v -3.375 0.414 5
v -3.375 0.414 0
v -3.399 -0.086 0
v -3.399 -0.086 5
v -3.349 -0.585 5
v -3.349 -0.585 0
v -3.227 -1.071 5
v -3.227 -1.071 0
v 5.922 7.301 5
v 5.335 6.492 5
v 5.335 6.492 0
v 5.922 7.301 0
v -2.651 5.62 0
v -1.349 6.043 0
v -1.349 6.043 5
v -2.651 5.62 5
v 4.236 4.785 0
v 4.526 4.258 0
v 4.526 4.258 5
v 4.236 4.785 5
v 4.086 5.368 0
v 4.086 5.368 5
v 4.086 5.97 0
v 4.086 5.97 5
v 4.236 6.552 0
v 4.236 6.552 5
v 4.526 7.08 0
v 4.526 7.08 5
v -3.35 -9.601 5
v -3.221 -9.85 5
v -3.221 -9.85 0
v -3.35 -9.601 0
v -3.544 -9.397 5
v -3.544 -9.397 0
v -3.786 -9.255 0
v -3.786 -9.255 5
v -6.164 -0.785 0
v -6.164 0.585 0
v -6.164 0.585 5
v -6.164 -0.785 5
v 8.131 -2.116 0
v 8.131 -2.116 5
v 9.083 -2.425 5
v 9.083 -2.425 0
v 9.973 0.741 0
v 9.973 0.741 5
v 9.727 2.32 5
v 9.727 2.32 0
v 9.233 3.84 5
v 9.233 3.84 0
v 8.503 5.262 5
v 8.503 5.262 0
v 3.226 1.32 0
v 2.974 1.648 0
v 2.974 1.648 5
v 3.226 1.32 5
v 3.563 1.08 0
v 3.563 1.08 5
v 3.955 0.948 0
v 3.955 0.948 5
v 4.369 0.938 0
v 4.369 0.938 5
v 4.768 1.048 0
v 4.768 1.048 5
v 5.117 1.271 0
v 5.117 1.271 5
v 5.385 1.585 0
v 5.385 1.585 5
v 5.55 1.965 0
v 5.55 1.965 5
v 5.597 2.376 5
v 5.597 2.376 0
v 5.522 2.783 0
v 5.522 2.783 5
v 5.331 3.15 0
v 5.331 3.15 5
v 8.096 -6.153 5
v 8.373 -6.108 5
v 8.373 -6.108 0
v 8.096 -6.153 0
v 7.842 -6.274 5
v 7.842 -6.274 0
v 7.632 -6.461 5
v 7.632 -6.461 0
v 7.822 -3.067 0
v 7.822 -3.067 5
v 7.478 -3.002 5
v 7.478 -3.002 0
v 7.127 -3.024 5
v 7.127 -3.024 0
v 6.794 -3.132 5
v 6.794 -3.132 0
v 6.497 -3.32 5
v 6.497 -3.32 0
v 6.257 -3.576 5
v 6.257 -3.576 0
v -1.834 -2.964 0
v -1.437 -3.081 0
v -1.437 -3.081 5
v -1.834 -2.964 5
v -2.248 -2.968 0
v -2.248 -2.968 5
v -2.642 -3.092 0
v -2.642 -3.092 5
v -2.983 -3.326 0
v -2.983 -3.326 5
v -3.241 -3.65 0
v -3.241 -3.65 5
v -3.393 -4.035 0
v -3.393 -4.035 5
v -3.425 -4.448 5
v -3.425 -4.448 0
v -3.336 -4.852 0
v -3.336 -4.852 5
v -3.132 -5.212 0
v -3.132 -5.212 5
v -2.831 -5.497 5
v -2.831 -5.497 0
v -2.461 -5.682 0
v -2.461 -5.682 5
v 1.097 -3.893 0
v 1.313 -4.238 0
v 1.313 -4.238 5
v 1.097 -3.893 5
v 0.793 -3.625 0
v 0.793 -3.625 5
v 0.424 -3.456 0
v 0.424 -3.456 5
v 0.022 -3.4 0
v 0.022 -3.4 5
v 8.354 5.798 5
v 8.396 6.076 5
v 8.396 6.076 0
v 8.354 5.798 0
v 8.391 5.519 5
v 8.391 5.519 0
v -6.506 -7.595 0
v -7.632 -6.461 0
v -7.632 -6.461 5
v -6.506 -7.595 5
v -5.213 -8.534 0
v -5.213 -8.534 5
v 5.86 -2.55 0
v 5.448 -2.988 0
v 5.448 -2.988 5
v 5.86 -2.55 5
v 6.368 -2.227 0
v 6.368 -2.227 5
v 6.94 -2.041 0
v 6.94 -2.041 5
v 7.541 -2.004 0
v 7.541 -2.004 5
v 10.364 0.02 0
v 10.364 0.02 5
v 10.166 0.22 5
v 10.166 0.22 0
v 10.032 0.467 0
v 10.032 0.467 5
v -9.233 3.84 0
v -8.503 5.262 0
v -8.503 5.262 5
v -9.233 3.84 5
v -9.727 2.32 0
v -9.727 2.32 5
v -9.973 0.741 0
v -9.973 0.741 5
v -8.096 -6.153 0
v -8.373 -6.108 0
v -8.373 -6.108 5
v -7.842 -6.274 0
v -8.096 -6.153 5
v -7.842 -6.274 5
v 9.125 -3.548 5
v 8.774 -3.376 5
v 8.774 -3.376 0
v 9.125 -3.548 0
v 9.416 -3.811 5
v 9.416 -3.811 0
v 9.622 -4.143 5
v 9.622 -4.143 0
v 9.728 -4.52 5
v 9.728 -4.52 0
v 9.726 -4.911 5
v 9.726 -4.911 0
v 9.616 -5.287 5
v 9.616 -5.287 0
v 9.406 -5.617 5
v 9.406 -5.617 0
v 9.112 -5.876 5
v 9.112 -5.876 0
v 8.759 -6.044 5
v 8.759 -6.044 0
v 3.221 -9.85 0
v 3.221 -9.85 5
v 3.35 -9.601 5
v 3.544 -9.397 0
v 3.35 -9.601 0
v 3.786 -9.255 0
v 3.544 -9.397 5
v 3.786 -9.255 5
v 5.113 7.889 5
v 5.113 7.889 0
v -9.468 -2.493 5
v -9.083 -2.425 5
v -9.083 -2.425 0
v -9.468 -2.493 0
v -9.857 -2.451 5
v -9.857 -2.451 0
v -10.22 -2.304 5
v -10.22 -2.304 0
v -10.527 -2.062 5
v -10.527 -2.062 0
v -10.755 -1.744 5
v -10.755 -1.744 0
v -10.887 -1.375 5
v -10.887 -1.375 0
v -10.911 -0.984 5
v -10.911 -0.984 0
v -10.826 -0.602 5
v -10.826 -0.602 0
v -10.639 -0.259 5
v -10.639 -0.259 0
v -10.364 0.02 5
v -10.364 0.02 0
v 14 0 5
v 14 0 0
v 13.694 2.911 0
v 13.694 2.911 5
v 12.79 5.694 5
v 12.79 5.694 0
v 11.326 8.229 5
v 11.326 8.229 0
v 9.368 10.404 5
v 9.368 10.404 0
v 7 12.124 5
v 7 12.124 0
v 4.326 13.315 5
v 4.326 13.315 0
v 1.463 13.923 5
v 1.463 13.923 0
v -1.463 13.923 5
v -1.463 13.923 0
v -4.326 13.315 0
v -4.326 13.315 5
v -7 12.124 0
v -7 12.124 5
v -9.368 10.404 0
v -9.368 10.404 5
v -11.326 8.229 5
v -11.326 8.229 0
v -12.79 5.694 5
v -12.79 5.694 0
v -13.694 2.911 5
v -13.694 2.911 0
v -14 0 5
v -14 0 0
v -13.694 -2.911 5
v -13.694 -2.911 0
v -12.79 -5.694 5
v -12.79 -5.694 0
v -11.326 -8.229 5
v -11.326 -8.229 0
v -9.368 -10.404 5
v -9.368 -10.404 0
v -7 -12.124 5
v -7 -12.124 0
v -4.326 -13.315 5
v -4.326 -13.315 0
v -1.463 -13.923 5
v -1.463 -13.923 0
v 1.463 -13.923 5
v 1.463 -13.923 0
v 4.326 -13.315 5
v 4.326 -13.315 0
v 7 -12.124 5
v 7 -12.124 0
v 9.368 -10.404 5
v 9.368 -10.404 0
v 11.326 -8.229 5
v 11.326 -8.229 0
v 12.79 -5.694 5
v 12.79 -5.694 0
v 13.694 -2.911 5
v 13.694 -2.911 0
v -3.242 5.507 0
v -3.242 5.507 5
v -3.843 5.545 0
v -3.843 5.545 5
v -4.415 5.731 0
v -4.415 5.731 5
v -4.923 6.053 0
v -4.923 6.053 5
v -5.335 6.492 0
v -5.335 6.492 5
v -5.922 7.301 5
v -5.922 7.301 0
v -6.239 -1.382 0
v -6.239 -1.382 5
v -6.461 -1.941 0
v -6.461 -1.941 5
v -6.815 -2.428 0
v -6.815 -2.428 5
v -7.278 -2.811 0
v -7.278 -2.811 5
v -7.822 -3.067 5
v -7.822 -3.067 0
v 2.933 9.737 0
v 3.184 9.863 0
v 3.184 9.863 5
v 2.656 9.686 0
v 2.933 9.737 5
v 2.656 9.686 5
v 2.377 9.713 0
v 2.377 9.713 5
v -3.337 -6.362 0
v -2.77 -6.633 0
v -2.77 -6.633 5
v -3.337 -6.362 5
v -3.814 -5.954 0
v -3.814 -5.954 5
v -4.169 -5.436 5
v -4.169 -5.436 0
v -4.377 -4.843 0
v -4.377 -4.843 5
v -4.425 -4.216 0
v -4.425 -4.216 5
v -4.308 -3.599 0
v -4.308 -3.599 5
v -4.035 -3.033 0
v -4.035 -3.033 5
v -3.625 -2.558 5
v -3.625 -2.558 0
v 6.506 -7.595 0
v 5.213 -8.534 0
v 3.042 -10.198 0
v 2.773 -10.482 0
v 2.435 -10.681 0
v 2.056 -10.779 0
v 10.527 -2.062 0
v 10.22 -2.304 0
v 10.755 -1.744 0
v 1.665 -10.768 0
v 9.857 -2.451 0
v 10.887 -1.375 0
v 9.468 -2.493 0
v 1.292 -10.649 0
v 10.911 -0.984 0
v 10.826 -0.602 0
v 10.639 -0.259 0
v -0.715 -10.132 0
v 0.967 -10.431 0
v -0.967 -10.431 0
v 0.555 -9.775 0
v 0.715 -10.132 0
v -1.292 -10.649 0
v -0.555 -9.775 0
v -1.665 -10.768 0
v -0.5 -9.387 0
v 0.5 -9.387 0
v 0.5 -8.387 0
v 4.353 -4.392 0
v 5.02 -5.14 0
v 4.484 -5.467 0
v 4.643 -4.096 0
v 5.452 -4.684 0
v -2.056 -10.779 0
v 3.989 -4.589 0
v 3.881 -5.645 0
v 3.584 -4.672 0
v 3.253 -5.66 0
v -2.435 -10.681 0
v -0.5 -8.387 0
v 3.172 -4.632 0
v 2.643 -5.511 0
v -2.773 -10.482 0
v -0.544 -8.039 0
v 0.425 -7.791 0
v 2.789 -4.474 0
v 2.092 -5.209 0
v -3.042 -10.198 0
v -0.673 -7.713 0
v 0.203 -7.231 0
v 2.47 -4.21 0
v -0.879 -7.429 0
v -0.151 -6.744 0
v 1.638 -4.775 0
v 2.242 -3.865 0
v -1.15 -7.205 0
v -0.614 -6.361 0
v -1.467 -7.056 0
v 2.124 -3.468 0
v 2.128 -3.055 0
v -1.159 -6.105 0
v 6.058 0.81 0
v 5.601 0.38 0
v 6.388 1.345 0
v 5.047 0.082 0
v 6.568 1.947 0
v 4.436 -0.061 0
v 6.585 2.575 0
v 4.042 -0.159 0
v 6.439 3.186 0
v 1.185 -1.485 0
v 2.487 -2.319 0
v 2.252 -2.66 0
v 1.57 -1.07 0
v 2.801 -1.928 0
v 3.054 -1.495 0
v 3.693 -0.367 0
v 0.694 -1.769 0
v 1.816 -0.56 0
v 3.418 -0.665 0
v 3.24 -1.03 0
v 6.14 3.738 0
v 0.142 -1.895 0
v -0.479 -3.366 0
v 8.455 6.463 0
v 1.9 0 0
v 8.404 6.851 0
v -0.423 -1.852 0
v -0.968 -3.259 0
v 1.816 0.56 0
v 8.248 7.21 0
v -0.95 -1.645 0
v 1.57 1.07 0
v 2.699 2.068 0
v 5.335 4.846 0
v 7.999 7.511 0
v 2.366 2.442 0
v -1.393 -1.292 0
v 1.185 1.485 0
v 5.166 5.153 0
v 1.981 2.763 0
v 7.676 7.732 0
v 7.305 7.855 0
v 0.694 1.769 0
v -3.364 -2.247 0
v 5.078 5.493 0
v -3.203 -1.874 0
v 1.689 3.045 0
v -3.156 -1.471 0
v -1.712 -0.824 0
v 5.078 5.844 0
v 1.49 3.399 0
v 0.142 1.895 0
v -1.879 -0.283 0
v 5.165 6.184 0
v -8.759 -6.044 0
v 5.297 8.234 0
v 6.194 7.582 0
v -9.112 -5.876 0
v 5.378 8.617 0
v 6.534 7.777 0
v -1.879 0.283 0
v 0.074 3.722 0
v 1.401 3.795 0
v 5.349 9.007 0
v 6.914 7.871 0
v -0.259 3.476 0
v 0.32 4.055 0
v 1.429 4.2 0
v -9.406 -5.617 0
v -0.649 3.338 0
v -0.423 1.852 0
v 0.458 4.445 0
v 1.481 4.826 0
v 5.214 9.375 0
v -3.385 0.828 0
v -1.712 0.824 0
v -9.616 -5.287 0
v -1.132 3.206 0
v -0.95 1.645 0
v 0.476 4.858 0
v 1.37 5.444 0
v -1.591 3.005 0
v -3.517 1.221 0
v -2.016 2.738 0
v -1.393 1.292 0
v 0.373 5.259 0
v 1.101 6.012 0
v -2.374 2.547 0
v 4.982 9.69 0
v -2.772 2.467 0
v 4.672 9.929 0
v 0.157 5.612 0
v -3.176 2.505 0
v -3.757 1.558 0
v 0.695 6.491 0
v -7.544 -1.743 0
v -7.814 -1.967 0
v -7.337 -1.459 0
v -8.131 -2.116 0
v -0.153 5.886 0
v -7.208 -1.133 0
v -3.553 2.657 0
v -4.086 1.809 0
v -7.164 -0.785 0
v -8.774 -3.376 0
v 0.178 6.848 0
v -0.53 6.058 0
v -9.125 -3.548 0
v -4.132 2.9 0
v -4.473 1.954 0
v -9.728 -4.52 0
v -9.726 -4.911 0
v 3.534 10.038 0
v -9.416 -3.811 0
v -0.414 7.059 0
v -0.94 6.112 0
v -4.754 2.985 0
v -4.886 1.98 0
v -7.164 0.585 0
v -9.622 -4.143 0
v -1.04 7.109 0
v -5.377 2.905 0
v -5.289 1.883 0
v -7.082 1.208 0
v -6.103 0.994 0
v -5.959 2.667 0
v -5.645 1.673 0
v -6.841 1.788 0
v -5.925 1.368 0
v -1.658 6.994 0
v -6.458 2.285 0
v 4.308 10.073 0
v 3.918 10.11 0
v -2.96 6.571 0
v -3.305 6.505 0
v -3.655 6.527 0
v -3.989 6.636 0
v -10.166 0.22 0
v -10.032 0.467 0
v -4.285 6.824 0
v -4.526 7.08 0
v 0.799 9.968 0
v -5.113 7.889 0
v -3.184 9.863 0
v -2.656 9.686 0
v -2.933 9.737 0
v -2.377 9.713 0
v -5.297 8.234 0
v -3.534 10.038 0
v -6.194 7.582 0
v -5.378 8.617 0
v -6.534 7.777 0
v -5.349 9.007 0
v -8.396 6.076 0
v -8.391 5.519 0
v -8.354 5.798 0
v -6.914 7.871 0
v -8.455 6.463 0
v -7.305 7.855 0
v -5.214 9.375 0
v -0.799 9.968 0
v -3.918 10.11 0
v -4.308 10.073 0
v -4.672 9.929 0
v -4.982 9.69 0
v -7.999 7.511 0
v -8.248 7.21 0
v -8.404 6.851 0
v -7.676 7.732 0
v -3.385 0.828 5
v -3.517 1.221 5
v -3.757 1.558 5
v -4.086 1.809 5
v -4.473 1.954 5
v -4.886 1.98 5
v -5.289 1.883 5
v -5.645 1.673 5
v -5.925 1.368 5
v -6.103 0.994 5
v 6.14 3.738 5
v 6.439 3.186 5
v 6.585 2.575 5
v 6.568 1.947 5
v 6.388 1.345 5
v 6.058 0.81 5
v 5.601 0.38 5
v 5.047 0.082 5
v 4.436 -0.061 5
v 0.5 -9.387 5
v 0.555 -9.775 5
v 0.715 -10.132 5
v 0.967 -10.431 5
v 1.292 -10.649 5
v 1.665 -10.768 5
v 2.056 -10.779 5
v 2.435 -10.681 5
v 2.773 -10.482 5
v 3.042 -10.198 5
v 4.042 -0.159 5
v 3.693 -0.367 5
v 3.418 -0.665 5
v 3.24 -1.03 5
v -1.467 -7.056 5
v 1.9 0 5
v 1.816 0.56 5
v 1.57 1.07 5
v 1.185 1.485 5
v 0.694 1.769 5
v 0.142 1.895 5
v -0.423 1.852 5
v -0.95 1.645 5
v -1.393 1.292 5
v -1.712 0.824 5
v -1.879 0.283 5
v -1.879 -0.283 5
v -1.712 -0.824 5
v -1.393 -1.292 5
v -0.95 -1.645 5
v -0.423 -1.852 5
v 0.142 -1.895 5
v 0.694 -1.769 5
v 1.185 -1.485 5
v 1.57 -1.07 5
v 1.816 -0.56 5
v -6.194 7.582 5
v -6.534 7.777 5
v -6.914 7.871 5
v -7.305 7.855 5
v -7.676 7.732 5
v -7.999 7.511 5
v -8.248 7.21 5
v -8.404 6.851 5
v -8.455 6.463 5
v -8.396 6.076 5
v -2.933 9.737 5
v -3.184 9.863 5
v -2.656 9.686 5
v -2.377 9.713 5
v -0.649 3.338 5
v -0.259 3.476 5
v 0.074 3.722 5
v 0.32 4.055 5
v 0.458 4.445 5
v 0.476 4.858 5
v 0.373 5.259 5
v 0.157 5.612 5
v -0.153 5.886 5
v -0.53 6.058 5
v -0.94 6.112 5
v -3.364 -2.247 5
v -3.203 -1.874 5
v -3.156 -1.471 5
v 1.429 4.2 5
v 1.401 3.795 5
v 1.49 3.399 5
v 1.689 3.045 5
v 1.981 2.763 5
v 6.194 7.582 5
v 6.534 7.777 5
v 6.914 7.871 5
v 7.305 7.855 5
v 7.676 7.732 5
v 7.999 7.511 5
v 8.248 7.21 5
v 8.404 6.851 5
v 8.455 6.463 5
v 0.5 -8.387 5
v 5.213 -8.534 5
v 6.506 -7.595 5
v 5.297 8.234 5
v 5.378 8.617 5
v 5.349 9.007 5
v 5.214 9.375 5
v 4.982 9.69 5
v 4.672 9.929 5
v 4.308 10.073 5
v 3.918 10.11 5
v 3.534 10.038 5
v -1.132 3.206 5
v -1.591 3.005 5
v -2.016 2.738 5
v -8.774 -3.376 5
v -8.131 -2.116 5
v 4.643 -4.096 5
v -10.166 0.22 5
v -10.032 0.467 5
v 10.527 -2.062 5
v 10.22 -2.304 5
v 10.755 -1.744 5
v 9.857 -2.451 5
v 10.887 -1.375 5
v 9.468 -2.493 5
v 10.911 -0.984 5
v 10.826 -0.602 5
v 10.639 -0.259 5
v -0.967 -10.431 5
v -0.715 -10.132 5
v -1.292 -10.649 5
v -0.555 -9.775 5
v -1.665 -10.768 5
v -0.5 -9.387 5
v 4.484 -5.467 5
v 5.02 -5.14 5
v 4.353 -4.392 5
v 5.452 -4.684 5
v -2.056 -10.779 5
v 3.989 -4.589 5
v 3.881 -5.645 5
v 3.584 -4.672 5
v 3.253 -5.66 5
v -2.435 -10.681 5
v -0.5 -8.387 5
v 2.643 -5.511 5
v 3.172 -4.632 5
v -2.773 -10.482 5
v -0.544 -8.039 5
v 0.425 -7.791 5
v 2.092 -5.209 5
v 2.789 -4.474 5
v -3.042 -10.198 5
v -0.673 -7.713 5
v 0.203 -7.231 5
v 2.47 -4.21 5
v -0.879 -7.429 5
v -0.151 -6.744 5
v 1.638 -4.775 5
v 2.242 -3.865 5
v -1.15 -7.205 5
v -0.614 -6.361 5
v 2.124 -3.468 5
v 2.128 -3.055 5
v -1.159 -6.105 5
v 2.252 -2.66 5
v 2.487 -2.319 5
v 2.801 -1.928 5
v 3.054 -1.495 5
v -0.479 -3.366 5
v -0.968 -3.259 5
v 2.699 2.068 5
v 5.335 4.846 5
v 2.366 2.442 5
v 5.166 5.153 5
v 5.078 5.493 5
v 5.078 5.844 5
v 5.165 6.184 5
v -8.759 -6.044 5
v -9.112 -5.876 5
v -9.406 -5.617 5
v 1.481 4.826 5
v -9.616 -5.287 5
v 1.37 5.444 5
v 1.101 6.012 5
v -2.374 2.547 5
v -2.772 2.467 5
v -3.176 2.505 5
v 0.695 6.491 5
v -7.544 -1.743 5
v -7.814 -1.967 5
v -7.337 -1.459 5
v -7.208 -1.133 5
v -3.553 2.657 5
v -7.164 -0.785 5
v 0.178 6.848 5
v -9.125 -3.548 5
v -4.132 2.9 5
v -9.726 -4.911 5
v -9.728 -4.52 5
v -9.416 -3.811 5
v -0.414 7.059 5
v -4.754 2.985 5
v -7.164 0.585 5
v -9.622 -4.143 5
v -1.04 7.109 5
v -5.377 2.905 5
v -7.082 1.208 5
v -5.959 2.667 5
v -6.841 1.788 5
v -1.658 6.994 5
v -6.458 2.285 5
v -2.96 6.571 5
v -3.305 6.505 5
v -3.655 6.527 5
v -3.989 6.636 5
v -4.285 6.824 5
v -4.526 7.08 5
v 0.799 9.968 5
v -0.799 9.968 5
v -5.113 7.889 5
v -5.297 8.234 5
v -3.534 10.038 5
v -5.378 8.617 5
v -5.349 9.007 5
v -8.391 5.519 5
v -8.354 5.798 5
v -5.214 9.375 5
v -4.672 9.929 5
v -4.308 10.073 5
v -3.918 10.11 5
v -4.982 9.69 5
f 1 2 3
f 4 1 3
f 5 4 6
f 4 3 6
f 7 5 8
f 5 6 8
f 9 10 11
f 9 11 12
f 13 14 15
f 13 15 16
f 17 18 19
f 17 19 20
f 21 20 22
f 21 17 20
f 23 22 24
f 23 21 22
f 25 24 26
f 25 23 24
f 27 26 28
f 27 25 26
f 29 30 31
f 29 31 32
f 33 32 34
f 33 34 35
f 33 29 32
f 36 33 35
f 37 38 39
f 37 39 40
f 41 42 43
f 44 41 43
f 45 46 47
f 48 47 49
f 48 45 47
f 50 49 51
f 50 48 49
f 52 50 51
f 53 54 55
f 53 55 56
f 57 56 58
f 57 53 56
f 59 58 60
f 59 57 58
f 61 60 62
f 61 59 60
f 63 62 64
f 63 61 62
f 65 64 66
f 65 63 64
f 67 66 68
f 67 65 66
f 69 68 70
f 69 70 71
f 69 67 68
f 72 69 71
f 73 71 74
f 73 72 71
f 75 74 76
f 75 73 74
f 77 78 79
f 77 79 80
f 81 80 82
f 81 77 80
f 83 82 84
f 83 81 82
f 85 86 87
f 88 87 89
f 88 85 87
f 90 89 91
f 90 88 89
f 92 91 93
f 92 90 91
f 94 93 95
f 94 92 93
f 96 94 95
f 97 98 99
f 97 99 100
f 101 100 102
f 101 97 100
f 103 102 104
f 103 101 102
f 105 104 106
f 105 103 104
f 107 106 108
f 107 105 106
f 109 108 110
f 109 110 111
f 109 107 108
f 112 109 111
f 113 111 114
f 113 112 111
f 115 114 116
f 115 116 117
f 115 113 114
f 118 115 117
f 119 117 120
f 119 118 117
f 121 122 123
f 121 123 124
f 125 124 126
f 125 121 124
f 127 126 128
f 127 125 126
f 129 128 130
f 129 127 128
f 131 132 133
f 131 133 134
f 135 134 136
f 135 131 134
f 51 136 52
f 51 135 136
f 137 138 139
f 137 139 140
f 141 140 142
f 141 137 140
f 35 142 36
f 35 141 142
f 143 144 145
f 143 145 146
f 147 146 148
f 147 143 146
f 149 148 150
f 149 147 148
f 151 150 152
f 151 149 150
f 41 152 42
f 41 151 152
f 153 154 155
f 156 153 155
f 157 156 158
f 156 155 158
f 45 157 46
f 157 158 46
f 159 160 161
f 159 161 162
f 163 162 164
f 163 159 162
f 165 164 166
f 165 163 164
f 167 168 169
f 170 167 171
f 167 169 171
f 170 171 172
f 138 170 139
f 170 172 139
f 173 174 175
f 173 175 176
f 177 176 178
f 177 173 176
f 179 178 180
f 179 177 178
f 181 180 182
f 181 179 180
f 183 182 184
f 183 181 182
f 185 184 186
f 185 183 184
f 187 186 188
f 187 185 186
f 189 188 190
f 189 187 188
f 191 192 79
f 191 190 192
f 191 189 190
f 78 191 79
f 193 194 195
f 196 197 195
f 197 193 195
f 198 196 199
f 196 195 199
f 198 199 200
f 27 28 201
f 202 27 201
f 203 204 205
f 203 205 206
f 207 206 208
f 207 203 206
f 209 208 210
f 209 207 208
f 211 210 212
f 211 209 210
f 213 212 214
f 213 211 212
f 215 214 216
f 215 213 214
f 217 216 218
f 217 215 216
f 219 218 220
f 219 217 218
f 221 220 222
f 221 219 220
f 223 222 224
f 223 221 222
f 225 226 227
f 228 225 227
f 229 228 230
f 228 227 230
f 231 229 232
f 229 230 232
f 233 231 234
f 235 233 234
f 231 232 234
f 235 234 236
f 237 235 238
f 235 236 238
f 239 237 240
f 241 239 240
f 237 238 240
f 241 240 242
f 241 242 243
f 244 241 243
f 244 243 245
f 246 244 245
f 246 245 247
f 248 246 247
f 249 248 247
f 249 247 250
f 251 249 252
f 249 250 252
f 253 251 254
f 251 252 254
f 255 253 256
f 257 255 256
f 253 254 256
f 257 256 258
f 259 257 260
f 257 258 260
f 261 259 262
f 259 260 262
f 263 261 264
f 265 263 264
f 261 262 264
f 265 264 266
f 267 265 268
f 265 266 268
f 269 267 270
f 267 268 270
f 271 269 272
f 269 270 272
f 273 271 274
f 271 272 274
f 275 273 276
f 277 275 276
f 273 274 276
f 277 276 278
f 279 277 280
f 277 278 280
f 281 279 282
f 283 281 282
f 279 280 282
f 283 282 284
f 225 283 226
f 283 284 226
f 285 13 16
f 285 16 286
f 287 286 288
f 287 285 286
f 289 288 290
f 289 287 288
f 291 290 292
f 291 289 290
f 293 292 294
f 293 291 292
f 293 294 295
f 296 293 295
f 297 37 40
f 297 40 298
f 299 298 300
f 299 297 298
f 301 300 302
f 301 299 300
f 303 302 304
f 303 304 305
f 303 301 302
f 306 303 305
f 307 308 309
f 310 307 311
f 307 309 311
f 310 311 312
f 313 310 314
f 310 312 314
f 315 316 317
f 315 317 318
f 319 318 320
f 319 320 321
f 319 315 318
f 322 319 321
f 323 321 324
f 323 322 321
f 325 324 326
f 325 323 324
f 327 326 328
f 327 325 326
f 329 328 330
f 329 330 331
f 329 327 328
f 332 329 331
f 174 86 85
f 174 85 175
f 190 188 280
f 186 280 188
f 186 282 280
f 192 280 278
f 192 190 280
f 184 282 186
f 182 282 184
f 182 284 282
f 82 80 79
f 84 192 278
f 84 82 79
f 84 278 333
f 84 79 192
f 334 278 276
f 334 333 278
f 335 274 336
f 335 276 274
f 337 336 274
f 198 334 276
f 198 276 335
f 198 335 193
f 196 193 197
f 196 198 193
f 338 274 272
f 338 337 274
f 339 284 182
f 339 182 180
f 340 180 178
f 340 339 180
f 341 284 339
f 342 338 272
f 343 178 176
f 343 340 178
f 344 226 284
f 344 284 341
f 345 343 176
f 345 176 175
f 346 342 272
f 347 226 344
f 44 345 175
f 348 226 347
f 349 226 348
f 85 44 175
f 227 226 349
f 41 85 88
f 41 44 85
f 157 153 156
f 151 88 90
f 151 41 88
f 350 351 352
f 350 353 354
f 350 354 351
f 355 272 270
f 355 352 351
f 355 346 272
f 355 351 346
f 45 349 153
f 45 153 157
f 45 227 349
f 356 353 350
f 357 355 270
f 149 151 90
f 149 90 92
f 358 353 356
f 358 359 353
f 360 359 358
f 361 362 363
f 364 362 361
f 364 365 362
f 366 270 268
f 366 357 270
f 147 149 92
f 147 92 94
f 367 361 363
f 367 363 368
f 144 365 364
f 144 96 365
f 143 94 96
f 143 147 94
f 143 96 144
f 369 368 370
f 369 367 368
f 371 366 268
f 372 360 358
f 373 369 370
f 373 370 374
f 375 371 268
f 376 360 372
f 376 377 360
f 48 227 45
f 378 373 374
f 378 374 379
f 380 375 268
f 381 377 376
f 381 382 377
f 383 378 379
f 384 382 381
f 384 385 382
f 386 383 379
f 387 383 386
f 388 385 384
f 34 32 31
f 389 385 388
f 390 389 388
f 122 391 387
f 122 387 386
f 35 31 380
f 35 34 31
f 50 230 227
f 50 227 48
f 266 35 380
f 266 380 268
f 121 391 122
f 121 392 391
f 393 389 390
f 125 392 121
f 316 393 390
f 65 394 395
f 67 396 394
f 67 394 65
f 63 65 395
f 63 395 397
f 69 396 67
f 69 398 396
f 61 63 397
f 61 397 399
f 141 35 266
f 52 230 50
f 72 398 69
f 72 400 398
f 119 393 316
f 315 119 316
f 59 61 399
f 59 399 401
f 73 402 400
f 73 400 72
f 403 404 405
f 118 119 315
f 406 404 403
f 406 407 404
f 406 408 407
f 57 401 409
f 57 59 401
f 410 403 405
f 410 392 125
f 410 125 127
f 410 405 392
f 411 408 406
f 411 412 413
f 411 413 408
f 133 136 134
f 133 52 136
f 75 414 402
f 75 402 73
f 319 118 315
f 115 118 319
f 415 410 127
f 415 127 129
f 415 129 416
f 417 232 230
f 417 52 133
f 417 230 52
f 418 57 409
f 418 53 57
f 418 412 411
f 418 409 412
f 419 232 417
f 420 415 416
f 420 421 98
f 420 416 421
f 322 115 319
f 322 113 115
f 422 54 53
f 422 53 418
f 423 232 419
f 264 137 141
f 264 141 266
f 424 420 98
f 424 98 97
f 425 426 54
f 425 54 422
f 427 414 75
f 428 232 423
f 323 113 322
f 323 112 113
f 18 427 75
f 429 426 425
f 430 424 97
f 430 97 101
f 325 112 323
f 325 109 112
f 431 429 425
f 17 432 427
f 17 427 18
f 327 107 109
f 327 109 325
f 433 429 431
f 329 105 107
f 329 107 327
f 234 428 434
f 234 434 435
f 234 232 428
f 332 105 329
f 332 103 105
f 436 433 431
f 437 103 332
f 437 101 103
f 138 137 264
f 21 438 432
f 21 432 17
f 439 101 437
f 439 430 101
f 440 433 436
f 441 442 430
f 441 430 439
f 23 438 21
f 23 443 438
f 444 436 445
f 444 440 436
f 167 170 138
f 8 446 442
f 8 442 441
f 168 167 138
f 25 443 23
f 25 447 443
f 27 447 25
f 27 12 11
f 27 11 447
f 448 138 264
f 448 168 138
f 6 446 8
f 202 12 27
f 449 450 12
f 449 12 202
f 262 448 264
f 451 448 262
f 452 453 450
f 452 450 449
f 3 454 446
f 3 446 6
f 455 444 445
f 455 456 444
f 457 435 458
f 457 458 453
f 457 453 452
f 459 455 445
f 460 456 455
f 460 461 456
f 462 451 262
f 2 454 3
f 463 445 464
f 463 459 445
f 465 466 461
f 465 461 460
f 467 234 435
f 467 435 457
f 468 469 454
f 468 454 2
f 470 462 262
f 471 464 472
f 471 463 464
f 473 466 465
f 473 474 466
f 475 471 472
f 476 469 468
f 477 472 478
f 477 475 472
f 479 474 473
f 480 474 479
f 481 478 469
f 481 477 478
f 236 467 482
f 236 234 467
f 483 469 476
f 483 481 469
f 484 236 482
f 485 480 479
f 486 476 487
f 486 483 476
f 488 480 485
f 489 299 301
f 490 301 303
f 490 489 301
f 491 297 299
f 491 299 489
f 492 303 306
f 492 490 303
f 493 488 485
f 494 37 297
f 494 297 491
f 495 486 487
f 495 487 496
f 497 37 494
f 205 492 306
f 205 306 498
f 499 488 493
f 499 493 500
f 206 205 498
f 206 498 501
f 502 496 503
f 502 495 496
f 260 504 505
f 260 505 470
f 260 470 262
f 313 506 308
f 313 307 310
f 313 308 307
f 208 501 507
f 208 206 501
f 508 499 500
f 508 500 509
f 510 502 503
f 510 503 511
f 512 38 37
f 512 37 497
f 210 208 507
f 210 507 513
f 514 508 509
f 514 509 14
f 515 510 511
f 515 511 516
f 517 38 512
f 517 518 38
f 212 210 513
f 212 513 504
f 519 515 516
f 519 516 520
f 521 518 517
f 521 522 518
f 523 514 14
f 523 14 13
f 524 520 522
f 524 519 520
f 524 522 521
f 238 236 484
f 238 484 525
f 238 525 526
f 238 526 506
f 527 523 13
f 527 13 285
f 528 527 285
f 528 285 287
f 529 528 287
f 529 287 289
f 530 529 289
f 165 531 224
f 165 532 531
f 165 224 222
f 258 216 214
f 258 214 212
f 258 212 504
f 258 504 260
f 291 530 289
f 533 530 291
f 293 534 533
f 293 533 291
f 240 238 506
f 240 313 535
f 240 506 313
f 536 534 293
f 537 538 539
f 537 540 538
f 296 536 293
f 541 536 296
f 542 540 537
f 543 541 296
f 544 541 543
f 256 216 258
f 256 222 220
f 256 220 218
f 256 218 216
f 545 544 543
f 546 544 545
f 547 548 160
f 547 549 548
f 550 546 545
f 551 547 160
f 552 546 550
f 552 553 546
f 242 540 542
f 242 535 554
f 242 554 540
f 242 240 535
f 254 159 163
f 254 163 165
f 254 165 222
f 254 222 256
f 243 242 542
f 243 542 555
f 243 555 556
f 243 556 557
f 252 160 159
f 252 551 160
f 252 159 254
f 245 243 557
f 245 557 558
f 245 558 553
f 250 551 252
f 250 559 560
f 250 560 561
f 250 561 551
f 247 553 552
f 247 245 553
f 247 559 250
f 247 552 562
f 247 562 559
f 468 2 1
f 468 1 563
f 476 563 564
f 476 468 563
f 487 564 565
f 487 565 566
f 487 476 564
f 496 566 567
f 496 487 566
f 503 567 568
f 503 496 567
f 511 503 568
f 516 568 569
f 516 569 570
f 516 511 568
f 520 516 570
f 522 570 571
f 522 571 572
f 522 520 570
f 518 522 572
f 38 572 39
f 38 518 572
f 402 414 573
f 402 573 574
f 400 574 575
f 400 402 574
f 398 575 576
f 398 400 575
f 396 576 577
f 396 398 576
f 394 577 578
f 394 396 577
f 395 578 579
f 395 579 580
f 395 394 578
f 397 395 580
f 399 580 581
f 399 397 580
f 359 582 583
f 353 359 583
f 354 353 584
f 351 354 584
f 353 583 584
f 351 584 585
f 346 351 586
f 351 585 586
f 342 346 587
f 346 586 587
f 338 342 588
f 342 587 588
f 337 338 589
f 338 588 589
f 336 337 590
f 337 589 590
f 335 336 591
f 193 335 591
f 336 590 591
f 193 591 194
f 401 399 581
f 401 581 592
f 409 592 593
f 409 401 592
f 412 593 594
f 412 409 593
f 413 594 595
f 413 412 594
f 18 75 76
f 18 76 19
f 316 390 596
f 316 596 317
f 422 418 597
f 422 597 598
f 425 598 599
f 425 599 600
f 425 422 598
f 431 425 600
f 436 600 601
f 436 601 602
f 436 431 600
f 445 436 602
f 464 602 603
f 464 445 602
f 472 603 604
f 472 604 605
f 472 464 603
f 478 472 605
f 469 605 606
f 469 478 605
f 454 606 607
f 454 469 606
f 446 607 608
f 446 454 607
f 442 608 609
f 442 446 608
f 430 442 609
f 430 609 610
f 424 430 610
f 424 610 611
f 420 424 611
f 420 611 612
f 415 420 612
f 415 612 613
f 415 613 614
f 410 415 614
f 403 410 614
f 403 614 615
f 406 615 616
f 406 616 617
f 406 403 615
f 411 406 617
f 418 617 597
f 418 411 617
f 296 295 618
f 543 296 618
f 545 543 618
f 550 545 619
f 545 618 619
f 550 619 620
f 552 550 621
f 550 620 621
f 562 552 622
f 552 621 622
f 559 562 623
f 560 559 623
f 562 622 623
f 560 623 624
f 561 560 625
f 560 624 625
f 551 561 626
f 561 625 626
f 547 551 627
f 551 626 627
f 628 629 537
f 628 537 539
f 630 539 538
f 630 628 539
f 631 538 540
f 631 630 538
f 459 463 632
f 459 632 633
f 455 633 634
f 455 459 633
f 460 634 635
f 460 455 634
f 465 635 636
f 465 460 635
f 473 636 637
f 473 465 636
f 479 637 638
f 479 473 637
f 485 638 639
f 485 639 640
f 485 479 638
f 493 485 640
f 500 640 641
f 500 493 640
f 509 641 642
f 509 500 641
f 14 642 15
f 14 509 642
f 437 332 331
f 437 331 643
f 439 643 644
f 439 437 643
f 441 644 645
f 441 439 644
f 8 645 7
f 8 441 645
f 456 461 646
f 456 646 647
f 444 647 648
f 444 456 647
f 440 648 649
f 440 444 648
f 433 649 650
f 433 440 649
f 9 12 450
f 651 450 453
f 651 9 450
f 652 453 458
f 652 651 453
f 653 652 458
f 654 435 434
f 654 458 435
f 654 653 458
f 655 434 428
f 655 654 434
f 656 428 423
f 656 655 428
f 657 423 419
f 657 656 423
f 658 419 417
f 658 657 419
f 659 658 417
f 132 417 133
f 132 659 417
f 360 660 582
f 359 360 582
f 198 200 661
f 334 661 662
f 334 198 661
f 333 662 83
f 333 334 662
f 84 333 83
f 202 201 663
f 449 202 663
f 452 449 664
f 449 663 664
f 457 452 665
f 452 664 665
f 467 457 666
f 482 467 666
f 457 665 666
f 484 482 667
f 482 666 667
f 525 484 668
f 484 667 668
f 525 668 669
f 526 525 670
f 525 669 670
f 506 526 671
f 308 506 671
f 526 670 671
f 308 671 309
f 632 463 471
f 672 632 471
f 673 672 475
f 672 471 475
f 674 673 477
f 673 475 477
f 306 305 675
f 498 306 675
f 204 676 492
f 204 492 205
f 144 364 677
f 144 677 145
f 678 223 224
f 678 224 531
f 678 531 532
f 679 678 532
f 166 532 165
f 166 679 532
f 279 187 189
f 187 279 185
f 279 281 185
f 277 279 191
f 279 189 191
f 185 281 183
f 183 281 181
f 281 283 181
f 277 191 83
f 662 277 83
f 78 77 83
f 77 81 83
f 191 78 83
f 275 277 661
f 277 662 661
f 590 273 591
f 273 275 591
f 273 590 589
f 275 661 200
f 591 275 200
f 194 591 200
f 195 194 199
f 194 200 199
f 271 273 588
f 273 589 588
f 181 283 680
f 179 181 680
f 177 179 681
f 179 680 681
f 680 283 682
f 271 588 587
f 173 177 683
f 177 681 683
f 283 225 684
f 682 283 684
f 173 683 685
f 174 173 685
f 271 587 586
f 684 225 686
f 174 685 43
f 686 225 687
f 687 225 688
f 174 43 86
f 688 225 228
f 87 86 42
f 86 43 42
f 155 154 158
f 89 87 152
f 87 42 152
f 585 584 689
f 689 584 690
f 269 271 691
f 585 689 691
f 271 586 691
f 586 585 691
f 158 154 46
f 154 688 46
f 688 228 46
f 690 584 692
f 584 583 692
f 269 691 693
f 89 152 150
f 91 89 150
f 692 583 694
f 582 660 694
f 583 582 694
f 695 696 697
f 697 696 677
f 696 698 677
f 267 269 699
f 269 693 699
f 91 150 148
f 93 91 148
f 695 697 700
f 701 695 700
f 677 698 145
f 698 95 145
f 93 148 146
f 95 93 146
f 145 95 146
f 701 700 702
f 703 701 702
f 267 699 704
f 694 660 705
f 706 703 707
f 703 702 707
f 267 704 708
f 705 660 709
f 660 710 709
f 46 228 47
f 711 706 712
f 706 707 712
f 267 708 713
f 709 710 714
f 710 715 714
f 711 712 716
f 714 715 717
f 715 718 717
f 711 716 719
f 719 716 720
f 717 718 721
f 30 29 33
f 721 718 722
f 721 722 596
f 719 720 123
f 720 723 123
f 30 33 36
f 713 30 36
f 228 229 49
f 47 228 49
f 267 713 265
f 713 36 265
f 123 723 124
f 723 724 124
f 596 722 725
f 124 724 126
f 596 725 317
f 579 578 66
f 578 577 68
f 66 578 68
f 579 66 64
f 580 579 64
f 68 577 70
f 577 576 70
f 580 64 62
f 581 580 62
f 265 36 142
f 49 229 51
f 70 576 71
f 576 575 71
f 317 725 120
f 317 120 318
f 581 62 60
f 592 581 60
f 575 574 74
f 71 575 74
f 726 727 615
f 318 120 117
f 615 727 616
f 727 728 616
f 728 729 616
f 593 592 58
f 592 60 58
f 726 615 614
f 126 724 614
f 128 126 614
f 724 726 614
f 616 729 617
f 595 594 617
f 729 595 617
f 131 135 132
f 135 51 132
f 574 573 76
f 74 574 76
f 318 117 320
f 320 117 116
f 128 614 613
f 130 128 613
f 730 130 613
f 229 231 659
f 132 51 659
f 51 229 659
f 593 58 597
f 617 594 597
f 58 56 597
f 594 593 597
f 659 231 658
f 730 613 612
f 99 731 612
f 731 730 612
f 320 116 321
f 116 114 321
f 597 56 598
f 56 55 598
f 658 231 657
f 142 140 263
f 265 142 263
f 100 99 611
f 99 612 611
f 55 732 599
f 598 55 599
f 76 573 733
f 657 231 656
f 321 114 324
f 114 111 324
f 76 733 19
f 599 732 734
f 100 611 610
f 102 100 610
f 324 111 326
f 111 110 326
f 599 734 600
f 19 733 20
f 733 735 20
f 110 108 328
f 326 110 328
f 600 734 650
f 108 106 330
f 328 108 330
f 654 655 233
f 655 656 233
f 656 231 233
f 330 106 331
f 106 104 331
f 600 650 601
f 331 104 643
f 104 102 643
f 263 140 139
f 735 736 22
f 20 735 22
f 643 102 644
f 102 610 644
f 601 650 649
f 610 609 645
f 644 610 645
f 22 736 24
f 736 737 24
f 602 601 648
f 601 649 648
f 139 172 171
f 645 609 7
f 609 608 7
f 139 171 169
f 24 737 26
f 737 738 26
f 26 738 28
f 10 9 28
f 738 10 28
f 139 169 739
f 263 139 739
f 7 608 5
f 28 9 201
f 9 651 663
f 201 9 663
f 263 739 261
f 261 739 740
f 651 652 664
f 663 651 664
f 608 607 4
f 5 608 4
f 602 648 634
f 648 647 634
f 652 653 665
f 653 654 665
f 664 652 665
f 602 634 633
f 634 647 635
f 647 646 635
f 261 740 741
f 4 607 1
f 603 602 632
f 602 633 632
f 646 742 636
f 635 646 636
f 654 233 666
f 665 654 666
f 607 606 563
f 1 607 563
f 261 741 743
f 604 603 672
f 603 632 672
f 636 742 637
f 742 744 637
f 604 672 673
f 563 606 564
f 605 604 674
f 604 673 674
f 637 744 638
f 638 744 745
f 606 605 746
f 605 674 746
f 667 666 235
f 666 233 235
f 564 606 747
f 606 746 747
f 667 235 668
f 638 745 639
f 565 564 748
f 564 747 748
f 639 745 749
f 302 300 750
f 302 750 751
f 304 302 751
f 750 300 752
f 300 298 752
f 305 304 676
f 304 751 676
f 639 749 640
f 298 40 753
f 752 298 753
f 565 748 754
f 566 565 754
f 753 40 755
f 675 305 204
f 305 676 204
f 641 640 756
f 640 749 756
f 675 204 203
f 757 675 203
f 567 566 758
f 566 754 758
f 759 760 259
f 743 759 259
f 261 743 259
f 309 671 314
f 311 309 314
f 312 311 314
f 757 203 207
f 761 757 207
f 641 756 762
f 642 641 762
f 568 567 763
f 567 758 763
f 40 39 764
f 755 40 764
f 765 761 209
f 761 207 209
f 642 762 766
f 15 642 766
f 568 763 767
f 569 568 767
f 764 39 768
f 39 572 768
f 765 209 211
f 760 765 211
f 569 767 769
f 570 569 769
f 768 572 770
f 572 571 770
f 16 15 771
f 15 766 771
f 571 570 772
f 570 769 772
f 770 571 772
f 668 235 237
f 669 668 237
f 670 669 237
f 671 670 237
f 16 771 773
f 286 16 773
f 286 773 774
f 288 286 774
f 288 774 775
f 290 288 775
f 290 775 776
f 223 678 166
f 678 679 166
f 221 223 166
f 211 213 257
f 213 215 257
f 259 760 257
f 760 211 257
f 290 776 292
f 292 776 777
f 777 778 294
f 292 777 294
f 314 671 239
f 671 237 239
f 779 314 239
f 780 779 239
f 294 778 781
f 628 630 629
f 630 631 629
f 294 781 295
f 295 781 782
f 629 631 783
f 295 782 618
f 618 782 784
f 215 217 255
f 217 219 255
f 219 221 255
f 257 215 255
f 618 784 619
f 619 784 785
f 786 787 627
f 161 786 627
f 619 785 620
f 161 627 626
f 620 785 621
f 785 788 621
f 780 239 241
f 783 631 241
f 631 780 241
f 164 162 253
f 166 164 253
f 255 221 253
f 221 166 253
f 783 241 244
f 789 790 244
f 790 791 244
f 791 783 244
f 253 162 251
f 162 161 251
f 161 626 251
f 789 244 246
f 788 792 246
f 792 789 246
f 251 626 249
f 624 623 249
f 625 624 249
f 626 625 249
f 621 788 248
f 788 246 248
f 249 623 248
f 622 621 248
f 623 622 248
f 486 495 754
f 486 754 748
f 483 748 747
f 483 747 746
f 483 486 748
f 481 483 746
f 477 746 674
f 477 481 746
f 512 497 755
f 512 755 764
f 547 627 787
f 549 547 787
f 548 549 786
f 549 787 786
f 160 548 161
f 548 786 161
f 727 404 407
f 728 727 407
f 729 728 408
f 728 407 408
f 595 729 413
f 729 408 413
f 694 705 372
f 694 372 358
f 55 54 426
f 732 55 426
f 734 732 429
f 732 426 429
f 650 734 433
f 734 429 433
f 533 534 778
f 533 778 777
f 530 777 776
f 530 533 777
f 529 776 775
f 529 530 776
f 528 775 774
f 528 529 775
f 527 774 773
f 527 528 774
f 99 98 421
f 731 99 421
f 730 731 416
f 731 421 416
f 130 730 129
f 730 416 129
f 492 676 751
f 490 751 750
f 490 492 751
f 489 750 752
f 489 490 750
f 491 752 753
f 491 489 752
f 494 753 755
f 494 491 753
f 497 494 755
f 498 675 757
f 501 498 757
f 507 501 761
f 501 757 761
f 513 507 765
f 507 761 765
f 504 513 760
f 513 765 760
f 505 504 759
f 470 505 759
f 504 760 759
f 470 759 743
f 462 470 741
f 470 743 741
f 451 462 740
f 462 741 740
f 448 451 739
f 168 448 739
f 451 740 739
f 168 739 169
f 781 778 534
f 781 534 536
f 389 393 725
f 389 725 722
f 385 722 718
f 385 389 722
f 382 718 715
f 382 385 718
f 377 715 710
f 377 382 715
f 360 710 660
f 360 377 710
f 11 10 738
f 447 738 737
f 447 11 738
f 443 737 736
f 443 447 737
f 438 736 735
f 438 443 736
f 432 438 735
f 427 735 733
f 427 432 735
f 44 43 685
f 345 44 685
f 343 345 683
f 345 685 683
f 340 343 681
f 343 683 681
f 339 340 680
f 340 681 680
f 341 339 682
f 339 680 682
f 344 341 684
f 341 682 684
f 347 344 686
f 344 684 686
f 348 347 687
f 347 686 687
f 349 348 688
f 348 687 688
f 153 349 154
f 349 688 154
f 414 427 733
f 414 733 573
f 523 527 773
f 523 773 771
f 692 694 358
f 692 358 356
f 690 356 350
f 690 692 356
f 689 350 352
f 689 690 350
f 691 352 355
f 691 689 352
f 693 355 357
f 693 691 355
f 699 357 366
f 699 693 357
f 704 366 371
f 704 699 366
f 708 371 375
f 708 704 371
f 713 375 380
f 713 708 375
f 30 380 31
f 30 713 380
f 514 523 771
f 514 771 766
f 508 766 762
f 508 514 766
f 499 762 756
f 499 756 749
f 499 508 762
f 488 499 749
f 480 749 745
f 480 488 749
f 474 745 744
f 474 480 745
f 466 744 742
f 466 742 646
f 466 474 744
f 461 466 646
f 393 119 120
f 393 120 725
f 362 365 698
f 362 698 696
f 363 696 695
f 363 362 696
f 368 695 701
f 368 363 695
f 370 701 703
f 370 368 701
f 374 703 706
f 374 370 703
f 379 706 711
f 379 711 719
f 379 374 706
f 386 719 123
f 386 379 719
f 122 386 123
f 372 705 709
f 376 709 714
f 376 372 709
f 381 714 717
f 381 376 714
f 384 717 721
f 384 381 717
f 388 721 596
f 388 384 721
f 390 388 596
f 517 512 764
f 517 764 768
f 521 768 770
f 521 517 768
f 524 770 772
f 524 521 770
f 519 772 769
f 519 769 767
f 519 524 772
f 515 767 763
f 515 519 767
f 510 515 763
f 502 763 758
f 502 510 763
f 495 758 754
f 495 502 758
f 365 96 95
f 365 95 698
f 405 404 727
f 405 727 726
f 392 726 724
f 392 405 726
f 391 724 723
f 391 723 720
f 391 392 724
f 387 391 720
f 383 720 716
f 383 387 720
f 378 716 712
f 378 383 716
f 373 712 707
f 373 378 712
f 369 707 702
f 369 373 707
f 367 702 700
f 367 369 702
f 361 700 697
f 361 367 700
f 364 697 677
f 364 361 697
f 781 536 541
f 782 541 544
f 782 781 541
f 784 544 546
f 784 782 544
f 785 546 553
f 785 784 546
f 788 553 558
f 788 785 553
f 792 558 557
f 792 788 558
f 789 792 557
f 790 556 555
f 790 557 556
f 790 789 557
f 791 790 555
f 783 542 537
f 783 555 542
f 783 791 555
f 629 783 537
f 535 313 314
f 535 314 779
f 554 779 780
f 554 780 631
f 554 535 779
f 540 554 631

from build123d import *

# Parameters (mm, degrees)
SKETCH1_R             = 3.4
SKETCH1_R_2           = 1.9
BOSS_EXTRUDE1_DEPTH   = 5
SKETCH1_R_3           = 14
SKETCH1_R_4           = 10
BOSS_EXTRUDE1_2_DEPTH = 5
BOSS_EXTRUDE3_START   = -5
BOSS_EXTRUDE3_DEPTH   = 5
CUT_EXTRUDE1_DEPTH    = 21.420577857


with BuildPart() as part:
    # Sketch1 → Boss-Extrude1 (new body)
    with BuildSketch(Plane.XY):
        Circle(SKETCH1_R)
        Circle(SKETCH1_R_2, mode=Mode.SUBTRACT)
    extrude(amount=BOSS_EXTRUDE1_DEPTH)



with BuildPart() as body_2:
    # Sketch1 → Boss-Extrude1 2 (new body)
    with BuildSketch(Plane.XY):
        Circle(SKETCH1_R_3)
        Circle(SKETCH1_R_4, mode=Mode.SUBTRACT)
    extrude(amount=BOSS_EXTRUDE1_2_DEPTH)


with BuildPart() as part_1:
    add(part.part)

    add(body_2.part)  # Boss-Extrude3 merges body 2
    # Sketch3 → Boss-Extrude3 (add)
    with BuildSketch(Plane.XY.offset(5).offset(BOSS_EXTRUDE3_START)):
        with BuildLine():
            Line((-2.461082993, -5.681791735), (-1.158545138, -6.104894644))
            ThreePointArc((-1.158545138, -6.104894644), (0.041583332, -6.976727004), (0.5, -8.387490686))
            ThreePointArc((0.5, -8.387490686), (1.026221783, -9.481342425), (2.209302326, -9.752896146))
            ThreePointArc((2.209302326, -9.752896146), (0, -10), (-2.209302326, -9.752896146))
            ThreePointArc((-2.209302326, -9.752896146), (-0.55013353, -8.758786407), (-1.467484664, -7.055976328))
            Line((-1.467484664, -7.055976328), (-2.770022518, -6.632873419))
            ThreePointArc((-2.770022518, -6.632873419), (-4.377477342, -4.842845432), (-3.62455882, -2.557845453))
            ThreePointArc((-3.62455882, -2.557845453), (-3.203111756, -1.874062431), (-3.226850513, -1.071184282))
            ThreePointArc((-3.226850513, -1.071184282), (-2.53927856, -2.260987482), (-1.43690209, -3.081446476))
            ThreePointArc((-1.43690209, -3.081446476), (-3.331173148, -3.837228711), (-2.461082993, -5.681791735))
        make_face()
        with BuildLine():
            Line((-6.164221523, 0.584858813), (-6.164109969, -0.784674291))
            ThreePointArc((-6.164109969, -0.784674291), (-6.622411723, -2.195475308), (-7.822469175, -3.06740542))
            ThreePointArc((-7.822469175, -3.06740542), (-8.700172525, -3.905890853), (-8.592843468, -5.114982027))
            ThreePointArc((-8.592843468, -5.114982027), (-9.510565163, -3.090169944), (-9.958267397, -0.91263928))
            ThreePointArc((-9.958267397, -0.91263928), (-8.500101497, -2.183405771), (-7.164109966, -0.784755745))
            Line((-7.164109966, -0.784755745), (-7.16422152, 0.584777358))
            ThreePointArc((-7.16422152, 0.584777358), (-5.958534597, 2.666706812), (-3.552705858, 2.656742571))
            ThreePointArc((-3.552705858, 2.656742571), (-2.772155254, 2.467223168), (-2.015908439, 2.73790306))
            ThreePointArc((-2.015908439, 2.73790306), (-2.935007106, 1.716313866), (-3.374656916, 0.414355768))
            ThreePointArc((-3.374656916, 0.414355768), (-4.678810484, 1.982365046), (-6.164221523, 0.584858813))
        make_face()
        with BuildLine():
            Line((-1.348615423, 6.04325436), (-2.651084333, 5.619939262))
            ThreePointArc((-2.651084333, 5.619939262), (-4.134458864, 5.619848642), (-5.334551826, 6.491729879))
            ThreePointArc((-5.334551826, 6.491729879), (-6.403224112, 7.067369122), (-7.519971649, 6.591663402))
            ThreePointArc((-7.519971649, 6.591663402), (-5.877852523, 8.090169944), (-3.945245395, 9.188854051))
            ThreePointArc((-3.945245395, 9.188854051), (-4.703218103, 7.409367429), (-2.960178794, 6.570970605))
            Line((-2.960178794, 6.570970605), (-1.657709884, 6.994285702))
            ThreePointArc((-1.657709884, 6.994285702), (0.694900438, 6.490960879), (1.428865848, 4.199802661))
            ThreePointArc((1.428865848, 4.199802661), (1.489825587, 3.398890206), (1.98095058, 2.763301431))
            ThreePointArc((1.98095058, 2.763301431), (0.725344411, 3.321727786), (-0.648750584, 3.337532424))
            ThreePointArc((-0.648750584, 3.337532424), (0.439509241, 5.062397688), (-1.348615423, 6.04325436))
        make_face()
        with BuildLine():
            Line((5.330731354, 3.150077785), (4.525649744, 4.25798777))
            ThreePointArc((4.525649744, 4.25798777), (4.06717562, 5.66873278), (4.525534832, 7.079515131))
            ThreePointArc((4.525534832, 7.079515131), (4.742762387, 8.273765181), (3.945245395, 9.188854051))
            ThreePointArc((3.945245395, 9.188854051), (5.877852523, 8.090169944), (7.519971649, 6.591663402))
            ThreePointArc((7.519971649, 6.591663402), (5.593352853, 6.762646678), (5.334618858, 4.845838918))
            Line((5.334618858, 4.845838918), (6.139700468, 3.737928933))
            ThreePointArc((6.139700468, 3.737928933), (6.388006686, 1.344927632), (4.435793517, -0.06112178))
            ThreePointArc((4.435793517, -0.06112178), (3.692918104, -0.366593497), (3.240203227, -1.030088854))
            ThreePointArc((3.240203227, -1.030088854), (3.383294606, 0.336626808), (2.973707004, 1.648352709))
            ThreePointArc((2.973707004, 1.648352709), (4.950442134, 1.14636879), (5.330731354, 3.150077785))
        make_face()
        with BuildLine():
            Line((4.643188585, -4.096399222), (5.448089696, -2.988358097))
            ThreePointArc((5.448089696, -2.988358097), (6.648111636, -2.116379111), (8.131486169, -2.116348904))
            ThreePointArc((8.131486169, -2.116348904), (9.334412468, -1.953901025), (9.958267397, -0.91263928))
            ThreePointArc((9.958267397, -0.91263928), (9.510565163, -3.090169944), (8.592843468, -5.114982027))
            ThreePointArc((8.592843468, -5.114982027), (8.160100277, -3.229821928), (6.257154566, -3.576077449))
            Line((6.257154566, -3.576077449), (5.452253454, -4.684118574))
            ThreePointArc((5.452253454, -4.684118574), (3.253104814, -5.659749891), (1.312605313, -4.237577998))
            ThreePointArc((1.312605313, -4.237577998), (0.792523319, -3.625457447), (0.021605145, -3.399931355))
            ThreePointArc((0.021605145, -3.399931355), (1.365646649, -3.113680977), (2.486602586, -2.318794424))
            ThreePointArc((2.486602586, -2.318794424), (2.620032257, -4.353902812), (4.643188585, -4.096399222))
        make_face()
    extrude(amount=BOSS_EXTRUDE3_DEPTH)

    # Sketch4 → Cut-Extrude1 (cut, through all)
    with BuildSketch(Plane.XY.offset(5)):
        with BuildLine():
            Line((0.5, -8.387490686), (0.5, -9.387490686))
            ThreePointArc((0.5, -9.387490686), (1.665239053, -10.767667231), (3.221267568, -9.850364333))
            ThreePointArc((3.221267568, -9.850364333), (3.43999971, -9.49227151), (3.786391015, -9.25544397))
            ThreePointArc((3.786391015, -9.25544397), (3.008147158, -9.536826027), (2.209302326, -9.752896146))
            ThreePointArc((2.209302326, -9.752896146), (1.026221783, -9.481342425), (0.5, -8.387490686))
        make_face()
        with BuildLine():
            Line((-0.5, -8.387490686), (-0.5, -9.387490686))
            ThreePointArc((-0.5, -9.387490686), (-1.665239053, -10.767667231), (-3.221267568, -9.850364333))
            ThreePointArc((-3.221267568, -9.850364333), (-3.43999971, -9.49227151), (-3.786391015, -9.25544397))
            ThreePointArc((-3.786391015, -9.25544397), (-3.008147158, -9.536826027), (-2.209302326, -9.752896146))
            ThreePointArc((-2.209302326, -9.752896146), (-1.026221783, -9.481342425), (-0.5, -8.387490686))
        make_face()
        with BuildLine():
            Line((-7.822469175, -3.06740542), (-8.773525691, -3.376422415))
            ThreePointArc((-8.773525691, -3.376422415), (-9.726072919, -4.911128617), (-8.372826765, -6.107537491))
            ThreePointArc((-8.372826765, -6.107537491), (-7.964668303, -6.204907352), (-7.632391128, -6.461161325))
            ThreePointArc((-7.632391128, -6.461161325), (-8.140491944, -5.807959272), (-8.592843468, -5.114982027))
            ThreePointArc((-8.592843468, -5.114982027), (-8.700172525, -3.905890853), (-7.822469175, -3.06740542))
        make_face()
        with BuildLine():
            Line((-8.131486169, -2.116348904), (-9.082542685, -2.425365898))
            ThreePointArc((-9.082542685, -2.425365898), (-10.755247253, -1.743655712), (-10.363679609, 0.019677532))
            ThreePointArc((-10.363679609, 0.019677532), (-10.090705045, 0.338360929), (-9.97250947, 0.740982371))
            ThreePointArc((-9.97250947, 0.740982371), (-9.999629131, -0.086123358), (-9.958267397, -0.91263928))
            ThreePointArc((-9.958267397, -0.91263928), (-9.334412468, -1.953901025), (-8.131486169, -2.116348904))
        make_face()
        with BuildLine():
            Line((-5.334551826, 6.491729879), (-5.922337078, 7.300746873))
            ThreePointArc((-5.922337078, 7.300746873), (-7.676282694, 7.732422823), (-8.395959091, 6.075698576))
            ThreePointArc((-8.395959091, 6.075698576), (-8.36243543, 5.657427869), (-8.503468148, 5.262226664))
            ThreePointArc((-8.503468148, 5.262226664), (-8.039247865, 5.947309792), (-7.519971649, 6.591663402))
            ThreePointArc((-7.519971649, 6.591663402), (-6.403224112, 7.067369122), (-5.334551826, 6.491729879))
        make_face()
        with BuildLine():
            Line((-4.525534832, 7.079515131), (-5.113320084, 7.888532125))
            ThreePointArc((-5.113320084, 7.888532125), (-4.981869307, 9.690028737), (-3.183838679, 9.862525716))
            ThreePointArc((-3.183838679, 9.862525716), (-2.796398978, 9.701390064), (-2.37695879, 9.71339626))
            ThreePointArc((-2.37695879, 9.71339626), (-3.17196352, 9.483598865), (-3.945245395, 9.188854051))
            ThreePointArc((-3.945245395, 9.188854051), (-4.742762387, 8.273765181), (-4.525534832, 7.079515131))
        make_face()
        with BuildLine():
            Line((4.525534832, 7.079515131), (5.113320084, 7.888532125))
            ThreePointArc((5.113320084, 7.888532125), (4.981869307, 9.690028737), (3.183838679, 9.862525716))
            ThreePointArc((3.183838679, 9.862525716), (2.796398978, 9.701390064), (2.37695879, 9.71339626))
            ThreePointArc((2.37695879, 9.71339626), (3.17196352, 9.483598865), (3.945245395, 9.188854051))
            ThreePointArc((3.945245395, 9.188854051), (4.742762387, 8.273765181), (4.525534832, 7.079515131))
        make_face()
        with BuildLine():
            Line((5.334551826, 6.491729879), (5.922337078, 7.300746873))
            ThreePointArc((5.922337078, 7.300746873), (7.676282694, 7.732422823), (8.395959091, 6.075698576))
            ThreePointArc((8.395959091, 6.075698576), (8.36243543, 5.657427869), (8.503468148, 5.262226664))
            ThreePointArc((8.503468148, 5.262226664), (8.039247865, 5.947309792), (7.519971649, 6.591663402))
            ThreePointArc((7.519971649, 6.591663402), (6.403224112, 7.067369122), (5.334551826, 6.491729879))
        make_face()
        with BuildLine():
            Line((8.131486169, -2.116348904), (9.082542685, -2.425365898))
            ThreePointArc((9.082542685, -2.425365898), (10.755247253, -1.743655712), (10.363679609, 0.019677532))
            ThreePointArc((10.363679609, 0.019677532), (10.090705045, 0.338360929), (9.97250947, 0.740982371))
            ThreePointArc((9.97250947, 0.740982371), (9.999629131, -0.086123358), (9.958267397, -0.91263928))
            ThreePointArc((9.958267397, -0.91263928), (9.334412468, -1.953901025), (8.131486169, -2.116348904))
        make_face()
        with BuildLine():
            Line((7.822469175, -3.06740542), (8.773525691, -3.376422415))
            ThreePointArc((8.773525691, -3.376422415), (9.726072919, -4.911128617), (8.372826765, -6.107537491))
            ThreePointArc((8.372826765, -6.107537491), (7.964668303, -6.204907352), (7.632391128, -6.461161325))
            ThreePointArc((7.632391128, -6.461161325), (8.140491944, -5.807959272), (8.592843468, -5.114982027))
            ThreePointArc((8.592843468, -5.114982027), (8.700172525, -3.905890853), (7.822469175, -3.06740542))
        make_face()
    extrude(amount=-CUT_EXTRUDE1_DEPTH, mode=Mode.SUBTRACT)


solid = part_1.part
